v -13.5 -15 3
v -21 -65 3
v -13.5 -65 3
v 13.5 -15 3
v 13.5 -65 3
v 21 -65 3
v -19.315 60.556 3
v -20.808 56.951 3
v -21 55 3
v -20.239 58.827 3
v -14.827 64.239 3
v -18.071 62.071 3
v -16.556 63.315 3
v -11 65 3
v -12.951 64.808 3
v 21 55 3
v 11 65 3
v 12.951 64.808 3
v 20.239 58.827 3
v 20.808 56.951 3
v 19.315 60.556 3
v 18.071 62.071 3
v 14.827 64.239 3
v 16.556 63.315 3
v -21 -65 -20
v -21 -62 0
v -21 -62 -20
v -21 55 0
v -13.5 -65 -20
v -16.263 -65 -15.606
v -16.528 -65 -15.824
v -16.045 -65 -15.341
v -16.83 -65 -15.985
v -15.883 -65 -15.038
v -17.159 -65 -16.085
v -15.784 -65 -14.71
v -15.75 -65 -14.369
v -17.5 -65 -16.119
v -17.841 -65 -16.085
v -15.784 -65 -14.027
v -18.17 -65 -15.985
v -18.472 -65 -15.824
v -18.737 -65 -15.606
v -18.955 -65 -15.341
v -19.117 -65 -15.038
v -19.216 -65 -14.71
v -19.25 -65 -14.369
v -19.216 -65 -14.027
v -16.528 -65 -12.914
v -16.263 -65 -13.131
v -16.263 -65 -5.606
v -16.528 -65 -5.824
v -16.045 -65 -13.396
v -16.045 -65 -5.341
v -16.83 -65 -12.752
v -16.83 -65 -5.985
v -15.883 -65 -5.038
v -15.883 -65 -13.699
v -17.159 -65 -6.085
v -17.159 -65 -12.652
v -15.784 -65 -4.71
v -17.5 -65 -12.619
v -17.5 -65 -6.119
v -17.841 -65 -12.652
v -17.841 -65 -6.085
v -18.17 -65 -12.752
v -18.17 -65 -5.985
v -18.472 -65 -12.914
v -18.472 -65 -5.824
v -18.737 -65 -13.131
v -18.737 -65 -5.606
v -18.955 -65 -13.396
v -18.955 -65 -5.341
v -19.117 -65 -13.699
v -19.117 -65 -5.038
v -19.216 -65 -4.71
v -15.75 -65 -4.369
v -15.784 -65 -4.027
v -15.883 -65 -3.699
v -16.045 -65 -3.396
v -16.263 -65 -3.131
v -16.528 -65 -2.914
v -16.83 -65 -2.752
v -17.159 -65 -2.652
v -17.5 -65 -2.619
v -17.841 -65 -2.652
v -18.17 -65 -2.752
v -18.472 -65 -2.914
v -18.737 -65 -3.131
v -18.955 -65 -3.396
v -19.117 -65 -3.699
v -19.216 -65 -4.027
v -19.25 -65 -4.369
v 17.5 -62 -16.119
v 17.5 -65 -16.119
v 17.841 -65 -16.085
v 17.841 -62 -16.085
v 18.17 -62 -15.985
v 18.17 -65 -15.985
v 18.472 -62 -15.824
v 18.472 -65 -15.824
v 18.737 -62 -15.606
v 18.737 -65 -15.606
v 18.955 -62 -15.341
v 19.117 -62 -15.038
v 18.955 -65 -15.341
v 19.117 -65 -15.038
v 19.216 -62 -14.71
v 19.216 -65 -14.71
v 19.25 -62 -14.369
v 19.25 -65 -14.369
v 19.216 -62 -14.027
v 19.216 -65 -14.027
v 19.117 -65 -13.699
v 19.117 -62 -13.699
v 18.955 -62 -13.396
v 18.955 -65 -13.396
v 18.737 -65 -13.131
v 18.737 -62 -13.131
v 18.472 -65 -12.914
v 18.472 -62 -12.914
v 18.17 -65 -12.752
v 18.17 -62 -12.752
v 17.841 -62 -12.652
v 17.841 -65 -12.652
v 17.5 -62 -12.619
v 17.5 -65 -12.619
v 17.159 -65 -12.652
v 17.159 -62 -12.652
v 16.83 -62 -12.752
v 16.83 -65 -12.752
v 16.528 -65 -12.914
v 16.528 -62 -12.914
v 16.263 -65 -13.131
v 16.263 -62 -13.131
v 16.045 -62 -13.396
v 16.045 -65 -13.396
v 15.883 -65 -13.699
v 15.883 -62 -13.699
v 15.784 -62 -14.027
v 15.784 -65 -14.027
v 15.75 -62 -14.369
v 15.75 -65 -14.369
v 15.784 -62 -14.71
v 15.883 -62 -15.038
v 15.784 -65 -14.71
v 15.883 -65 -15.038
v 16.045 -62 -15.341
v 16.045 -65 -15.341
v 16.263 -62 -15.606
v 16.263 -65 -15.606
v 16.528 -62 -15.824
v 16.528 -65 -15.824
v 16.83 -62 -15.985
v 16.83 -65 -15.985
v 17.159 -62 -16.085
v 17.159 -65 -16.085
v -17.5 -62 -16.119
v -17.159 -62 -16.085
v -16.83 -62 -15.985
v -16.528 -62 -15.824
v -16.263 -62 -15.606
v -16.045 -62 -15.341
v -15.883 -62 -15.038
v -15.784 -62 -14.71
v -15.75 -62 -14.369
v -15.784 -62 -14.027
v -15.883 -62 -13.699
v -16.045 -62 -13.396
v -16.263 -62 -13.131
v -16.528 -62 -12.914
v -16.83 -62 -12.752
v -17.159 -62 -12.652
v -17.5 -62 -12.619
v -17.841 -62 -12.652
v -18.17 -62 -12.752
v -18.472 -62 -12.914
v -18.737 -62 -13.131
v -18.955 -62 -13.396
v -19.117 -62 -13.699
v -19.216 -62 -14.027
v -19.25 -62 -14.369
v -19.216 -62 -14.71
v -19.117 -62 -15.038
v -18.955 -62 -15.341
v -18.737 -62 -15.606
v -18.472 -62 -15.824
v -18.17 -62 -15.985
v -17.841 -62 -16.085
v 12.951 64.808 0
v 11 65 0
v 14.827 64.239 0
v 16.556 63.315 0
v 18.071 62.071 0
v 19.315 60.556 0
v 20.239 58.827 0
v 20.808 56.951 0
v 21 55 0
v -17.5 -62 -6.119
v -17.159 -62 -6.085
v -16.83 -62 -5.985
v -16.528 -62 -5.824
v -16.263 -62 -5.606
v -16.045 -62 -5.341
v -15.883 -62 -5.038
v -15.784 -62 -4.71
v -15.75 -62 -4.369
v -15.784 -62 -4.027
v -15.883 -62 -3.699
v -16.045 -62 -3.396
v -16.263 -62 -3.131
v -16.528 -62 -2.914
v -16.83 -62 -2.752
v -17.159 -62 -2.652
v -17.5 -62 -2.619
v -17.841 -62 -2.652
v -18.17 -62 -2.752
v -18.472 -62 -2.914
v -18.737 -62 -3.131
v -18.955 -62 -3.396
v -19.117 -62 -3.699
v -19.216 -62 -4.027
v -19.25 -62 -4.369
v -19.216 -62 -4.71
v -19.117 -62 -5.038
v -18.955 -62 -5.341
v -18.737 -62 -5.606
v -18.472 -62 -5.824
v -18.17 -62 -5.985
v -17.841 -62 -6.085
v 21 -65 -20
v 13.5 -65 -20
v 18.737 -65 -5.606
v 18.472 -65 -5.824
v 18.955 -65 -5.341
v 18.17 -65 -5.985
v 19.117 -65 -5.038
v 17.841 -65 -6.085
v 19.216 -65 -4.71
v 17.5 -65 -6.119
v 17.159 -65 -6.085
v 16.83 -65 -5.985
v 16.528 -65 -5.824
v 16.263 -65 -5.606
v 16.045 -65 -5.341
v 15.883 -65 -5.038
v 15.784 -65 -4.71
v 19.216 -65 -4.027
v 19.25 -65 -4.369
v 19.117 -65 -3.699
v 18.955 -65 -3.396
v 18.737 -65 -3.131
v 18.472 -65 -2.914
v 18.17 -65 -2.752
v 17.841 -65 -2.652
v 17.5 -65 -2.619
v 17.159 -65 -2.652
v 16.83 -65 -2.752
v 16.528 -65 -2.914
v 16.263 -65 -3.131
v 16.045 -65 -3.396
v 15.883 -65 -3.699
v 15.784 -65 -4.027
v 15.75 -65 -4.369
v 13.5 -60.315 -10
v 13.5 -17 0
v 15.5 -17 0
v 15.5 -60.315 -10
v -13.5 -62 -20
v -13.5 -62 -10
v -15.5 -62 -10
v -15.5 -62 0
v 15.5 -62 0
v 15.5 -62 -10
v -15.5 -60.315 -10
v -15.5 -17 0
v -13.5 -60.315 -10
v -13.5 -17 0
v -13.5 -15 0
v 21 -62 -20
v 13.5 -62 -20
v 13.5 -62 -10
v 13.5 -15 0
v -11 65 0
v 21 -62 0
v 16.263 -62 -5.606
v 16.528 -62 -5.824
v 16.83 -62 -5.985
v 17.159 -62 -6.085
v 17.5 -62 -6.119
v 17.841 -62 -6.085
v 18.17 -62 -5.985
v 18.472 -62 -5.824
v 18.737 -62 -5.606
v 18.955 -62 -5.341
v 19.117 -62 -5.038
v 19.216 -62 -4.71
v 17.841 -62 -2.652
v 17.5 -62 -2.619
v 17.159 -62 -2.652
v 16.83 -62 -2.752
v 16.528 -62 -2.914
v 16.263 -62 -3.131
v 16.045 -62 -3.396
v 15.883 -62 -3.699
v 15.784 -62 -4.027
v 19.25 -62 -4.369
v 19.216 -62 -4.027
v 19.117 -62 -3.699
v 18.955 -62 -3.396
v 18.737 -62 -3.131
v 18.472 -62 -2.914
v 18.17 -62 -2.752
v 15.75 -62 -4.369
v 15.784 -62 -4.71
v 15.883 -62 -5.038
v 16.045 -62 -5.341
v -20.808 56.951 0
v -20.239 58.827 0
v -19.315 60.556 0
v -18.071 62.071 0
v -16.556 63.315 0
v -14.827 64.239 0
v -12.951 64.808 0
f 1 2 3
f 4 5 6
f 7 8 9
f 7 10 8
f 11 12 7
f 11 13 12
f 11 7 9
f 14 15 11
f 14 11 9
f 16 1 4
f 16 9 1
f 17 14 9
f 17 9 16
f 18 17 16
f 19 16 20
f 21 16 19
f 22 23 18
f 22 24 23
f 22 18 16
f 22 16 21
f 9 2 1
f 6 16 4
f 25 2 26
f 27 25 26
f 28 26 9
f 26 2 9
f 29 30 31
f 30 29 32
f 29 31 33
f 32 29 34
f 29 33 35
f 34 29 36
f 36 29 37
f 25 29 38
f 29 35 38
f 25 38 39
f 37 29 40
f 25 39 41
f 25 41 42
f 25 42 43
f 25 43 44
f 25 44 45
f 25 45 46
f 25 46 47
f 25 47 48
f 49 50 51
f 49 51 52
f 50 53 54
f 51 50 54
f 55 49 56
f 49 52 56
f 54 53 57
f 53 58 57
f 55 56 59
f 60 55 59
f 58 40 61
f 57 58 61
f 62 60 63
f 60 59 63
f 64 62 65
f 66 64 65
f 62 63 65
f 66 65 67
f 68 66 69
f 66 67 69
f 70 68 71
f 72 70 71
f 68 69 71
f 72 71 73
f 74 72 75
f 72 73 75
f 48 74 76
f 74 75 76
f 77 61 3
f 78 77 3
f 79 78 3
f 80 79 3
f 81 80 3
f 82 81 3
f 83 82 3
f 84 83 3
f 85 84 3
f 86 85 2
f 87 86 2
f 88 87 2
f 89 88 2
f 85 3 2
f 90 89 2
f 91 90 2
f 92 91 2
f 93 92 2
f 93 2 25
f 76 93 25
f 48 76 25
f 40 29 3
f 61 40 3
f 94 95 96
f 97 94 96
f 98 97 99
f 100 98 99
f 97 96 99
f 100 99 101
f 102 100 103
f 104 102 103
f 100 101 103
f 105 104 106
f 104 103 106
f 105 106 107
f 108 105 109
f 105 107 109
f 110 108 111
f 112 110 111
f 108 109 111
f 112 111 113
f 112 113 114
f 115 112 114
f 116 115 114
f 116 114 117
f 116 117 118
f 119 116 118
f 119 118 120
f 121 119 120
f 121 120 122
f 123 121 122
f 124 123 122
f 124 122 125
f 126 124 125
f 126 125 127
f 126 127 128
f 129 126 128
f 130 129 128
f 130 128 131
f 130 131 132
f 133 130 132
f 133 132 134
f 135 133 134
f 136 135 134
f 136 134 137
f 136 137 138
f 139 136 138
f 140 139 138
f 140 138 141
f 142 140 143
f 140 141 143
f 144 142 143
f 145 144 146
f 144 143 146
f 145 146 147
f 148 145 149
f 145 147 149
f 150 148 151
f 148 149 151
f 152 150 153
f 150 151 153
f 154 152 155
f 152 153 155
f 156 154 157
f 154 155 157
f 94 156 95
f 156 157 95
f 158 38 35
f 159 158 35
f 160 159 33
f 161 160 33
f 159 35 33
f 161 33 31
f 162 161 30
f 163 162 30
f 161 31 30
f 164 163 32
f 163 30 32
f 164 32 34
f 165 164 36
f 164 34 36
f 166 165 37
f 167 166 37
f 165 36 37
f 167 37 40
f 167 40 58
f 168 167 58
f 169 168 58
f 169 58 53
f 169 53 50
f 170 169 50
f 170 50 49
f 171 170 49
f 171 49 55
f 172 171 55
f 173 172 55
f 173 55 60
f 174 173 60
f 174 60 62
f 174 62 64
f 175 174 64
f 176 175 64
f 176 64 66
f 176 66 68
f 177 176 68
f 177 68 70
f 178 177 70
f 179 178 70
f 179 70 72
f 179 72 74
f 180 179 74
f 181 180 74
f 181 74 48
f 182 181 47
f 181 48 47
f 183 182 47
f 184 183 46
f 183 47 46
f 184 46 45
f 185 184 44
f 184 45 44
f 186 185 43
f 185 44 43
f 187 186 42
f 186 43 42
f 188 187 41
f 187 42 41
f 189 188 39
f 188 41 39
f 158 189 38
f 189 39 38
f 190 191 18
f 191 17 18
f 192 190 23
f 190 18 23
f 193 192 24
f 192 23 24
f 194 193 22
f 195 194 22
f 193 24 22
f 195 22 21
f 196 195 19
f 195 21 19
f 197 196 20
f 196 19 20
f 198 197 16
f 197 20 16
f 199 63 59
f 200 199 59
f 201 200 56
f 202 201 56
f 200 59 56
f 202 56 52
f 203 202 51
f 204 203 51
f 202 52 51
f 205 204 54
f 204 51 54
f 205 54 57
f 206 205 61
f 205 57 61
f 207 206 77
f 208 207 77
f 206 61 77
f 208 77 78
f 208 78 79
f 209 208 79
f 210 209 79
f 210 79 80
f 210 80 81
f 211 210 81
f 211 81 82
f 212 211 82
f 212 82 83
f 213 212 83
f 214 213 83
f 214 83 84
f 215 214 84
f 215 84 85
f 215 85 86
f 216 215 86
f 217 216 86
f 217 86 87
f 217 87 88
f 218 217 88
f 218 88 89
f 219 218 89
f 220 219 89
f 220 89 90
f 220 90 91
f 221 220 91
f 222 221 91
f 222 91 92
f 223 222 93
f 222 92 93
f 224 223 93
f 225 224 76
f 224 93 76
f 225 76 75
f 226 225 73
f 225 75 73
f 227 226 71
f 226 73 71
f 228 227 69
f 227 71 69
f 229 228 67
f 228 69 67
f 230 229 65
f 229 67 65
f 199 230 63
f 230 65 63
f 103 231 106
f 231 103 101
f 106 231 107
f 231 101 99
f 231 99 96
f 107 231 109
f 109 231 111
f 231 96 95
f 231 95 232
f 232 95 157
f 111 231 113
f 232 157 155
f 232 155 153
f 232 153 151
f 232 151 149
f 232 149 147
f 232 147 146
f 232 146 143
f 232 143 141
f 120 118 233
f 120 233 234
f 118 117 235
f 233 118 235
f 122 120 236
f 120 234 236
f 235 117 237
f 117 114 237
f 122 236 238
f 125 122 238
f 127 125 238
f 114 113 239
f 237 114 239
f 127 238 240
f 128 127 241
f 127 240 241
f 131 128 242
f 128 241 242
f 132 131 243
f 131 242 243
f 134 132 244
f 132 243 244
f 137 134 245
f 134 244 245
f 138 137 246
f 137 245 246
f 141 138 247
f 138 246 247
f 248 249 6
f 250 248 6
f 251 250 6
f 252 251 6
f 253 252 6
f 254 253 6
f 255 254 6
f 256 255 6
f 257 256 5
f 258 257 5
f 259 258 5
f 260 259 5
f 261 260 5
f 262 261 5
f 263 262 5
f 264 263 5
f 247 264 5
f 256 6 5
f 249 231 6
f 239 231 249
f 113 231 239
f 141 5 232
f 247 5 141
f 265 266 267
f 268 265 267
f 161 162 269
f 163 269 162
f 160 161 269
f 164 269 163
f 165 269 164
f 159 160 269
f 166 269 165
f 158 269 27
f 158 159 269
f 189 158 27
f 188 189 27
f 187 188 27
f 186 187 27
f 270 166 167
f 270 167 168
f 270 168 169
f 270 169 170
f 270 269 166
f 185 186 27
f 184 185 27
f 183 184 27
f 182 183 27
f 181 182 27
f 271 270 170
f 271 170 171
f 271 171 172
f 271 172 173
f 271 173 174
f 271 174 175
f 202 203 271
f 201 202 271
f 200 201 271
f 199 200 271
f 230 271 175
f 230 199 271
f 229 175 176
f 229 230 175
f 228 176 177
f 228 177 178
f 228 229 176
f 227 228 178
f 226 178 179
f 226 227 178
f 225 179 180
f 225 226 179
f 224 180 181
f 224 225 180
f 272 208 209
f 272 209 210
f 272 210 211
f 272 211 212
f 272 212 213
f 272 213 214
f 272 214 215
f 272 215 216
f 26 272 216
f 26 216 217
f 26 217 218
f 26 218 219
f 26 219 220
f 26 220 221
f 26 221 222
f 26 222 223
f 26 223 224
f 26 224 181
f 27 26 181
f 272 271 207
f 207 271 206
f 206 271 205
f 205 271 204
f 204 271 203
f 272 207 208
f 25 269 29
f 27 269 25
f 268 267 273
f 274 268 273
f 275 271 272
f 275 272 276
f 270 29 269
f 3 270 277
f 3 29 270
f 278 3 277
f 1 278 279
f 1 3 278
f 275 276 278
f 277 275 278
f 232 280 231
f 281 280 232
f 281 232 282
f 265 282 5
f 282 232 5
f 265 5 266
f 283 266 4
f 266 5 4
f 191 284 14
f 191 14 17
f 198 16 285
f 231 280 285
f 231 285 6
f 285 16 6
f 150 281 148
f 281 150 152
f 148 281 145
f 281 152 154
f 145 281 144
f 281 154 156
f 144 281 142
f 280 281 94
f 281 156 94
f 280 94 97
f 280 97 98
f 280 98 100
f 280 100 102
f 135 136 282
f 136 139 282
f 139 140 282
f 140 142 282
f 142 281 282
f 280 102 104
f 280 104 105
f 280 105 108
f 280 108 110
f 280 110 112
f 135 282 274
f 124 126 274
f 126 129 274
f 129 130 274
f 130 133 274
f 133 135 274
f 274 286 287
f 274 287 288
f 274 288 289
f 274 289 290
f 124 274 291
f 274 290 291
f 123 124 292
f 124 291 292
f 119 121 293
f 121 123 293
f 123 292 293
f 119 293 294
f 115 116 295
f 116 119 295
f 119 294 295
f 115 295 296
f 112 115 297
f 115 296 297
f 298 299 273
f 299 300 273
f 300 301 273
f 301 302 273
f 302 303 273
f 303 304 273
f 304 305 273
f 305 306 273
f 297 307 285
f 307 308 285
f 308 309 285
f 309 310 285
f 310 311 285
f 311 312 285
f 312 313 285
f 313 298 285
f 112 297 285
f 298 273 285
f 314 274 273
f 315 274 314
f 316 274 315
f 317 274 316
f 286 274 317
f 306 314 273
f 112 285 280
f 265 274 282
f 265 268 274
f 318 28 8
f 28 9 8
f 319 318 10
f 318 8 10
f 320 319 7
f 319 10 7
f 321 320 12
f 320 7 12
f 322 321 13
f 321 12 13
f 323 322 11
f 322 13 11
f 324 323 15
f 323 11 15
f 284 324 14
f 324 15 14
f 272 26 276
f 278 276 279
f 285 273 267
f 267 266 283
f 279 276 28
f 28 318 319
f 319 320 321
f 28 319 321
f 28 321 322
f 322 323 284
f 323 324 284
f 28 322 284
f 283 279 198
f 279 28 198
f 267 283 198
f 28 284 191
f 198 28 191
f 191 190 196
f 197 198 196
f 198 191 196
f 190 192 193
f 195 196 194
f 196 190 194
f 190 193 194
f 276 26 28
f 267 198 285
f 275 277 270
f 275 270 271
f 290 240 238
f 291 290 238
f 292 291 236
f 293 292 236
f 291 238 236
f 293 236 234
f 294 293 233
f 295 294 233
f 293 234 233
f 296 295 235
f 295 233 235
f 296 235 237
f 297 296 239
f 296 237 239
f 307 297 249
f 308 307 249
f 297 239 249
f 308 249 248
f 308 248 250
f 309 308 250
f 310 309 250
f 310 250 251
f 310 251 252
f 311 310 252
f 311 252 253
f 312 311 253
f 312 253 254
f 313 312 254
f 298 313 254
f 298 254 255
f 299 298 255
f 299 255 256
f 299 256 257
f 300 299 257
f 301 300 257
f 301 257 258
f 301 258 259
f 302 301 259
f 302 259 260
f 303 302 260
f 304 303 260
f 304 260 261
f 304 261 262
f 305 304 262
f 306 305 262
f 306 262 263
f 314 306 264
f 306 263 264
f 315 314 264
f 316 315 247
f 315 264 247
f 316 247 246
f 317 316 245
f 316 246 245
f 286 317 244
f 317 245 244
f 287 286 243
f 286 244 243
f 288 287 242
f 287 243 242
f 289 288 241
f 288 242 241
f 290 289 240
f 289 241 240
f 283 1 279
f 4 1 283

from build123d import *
from OCP.BRepFilletAPI import BRepFilletAPI_MakeChamfer

# Parameters (mm, degrees)
SKETCH1_W           = 42
SKETCH1_H           = 130
BOSS_EXTRUDE1_DEPTH = 3
SKETCH2_W           = 27
SKETCH2_H           = 100
CUT_EXTRUDE1_DEPTH  = 3
BOSS_EXTRUDE2_DEPTH = 10
CHAMFER1_SIZE       = 43.314758743
CHAMFER1_SIZE_2     = 10
SKETCH5_R           = 1.75
CUT_EXTRUDE2_DEPTH  = 10
SKETCH6_W           = 7.5
SKETCH6_H           = 3
BOSS_EXTRUDE3_DEPTH = 10
LPATTERN1_COUNT     = 2
LPATTERN1_PITCH     = 10
FILLET1_R           = 10


with BuildPart() as part:
    # Sketch1 → Boss-Extrude1 (new body)
    with BuildSketch(Plane.XY):
        Rectangle(SKETCH1_W, SKETCH1_H)
    extrude(amount=BOSS_EXTRUDE1_DEPTH)

    # Sketch2 → Cut-Extrude1 (cut)
    with BuildSketch(Plane.XY.offset(3)):
        with Locations((0, -65)):
            Rectangle(SKETCH2_W, SKETCH2_H)
    extrude(amount=-CUT_EXTRUDE1_DEPTH, mode=Mode.SUBTRACT)

    # Sketch3 → Boss-Extrude2 (add)
    with BuildSketch(Plane(origin=(0, 0, 0), x_dir=(-1, 0, 0), z_dir=(0, 0, -1))):
        Polygon((-21, -65), (-13.5, -65), (-13.5, -62), (-13.5, -17), (-15.5, -17), (-15.5, -62), (-21, -62), align=None)
        Polygon((13.5, -65), (21, -65), (21, -62), (15.5, -62), (15.5, -17), (13.5, -17), (13.5, -62), align=None)
    extrude(amount=BOSS_EXTRUDE2_DEPTH)

    # Chamfer1
    chamfer1_edges_1 = [part.edges().sort_by_distance(p)[0] for p in [
        (-14.5, -17, -10),
    ]]
    chamfer1_side_1 = [part.faces().sort_by_distance(p)[0] for p in [
        (-14.5, -17.2, -10),
    ]]
    chamfer1_edges_2 = [part.edges().sort_by_distance(p)[0] for p in [
        (14.5, -17, -10),
    ]]
    chamfer1_side_2 = [part.faces().sort_by_distance(p)[0] for p in [
        (14.5, -17.2, -10),
    ]]
    chamfer1 = BRepFilletAPI_MakeChamfer(part.part.solid().wrapped)
    for e in chamfer1_edges_1:
        chamfer1.Add(CHAMFER1_SIZE - 0.0001, CHAMFER1_SIZE_2 - 0.0001, e.wrapped, chamfer1_side_1[0].wrapped)
    for e in chamfer1_edges_2:
        chamfer1.Add(CHAMFER1_SIZE - 0.0001, CHAMFER1_SIZE_2 - 0.0001, e.wrapped, chamfer1_side_2[0].wrapped)
    add(Compound.cast(chamfer1.Shape()), mode=Mode.REPLACE)  # a hair under: the kernel refuses the full size

    # Sketch5 → Cut-Extrude2 (cut)
    with BuildSketch(Plane.XZ.offset(65)):
        with Locations(Location((-17.5, -4.36859694, 0), (0, 0, 270))):
            Circle(SKETCH5_R)
        with Locations(Location((17.5, -4.36859694, 0), (0, 0, 270))):
            Circle(SKETCH5_R)
    cut_extrude2 = extrude(amount=-CUT_EXTRUDE2_DEPTH, mode=Mode.SUBTRACT)

    # Sketch6 → Boss-Extrude3 (add)
    with BuildSketch(Plane(origin=(0, 0, -10), x_dir=(-1, 0, 0), z_dir=(0, 0, -1))):
        with Locations((17.25, -63.5)):
            Rectangle(SKETCH6_W, SKETCH6_H)
        with Locations((-17.25, -63.5)):
            Rectangle(SKETCH6_W, SKETCH6_H)
    extrude(amount=BOSS_EXTRUDE3_DEPTH)

    # LPattern1: Cut-Extrude2 ×2
    with Locations(*[(0, 0, -i * LPATTERN1_PITCH) for i in range(1, LPATTERN1_COUNT)]):
        add(cut_extrude2, mode=Mode.SUBTRACT)

    # Fillet1
    fillet1_edges = [part.edges().sort_by_distance(p)[0] for p in [
        (-21, 65, 1.5),
        (21, 65, 1.5),
    ]]
    fillet(fillet1_edges, radius=FILLET1_R)


solid = part.part
